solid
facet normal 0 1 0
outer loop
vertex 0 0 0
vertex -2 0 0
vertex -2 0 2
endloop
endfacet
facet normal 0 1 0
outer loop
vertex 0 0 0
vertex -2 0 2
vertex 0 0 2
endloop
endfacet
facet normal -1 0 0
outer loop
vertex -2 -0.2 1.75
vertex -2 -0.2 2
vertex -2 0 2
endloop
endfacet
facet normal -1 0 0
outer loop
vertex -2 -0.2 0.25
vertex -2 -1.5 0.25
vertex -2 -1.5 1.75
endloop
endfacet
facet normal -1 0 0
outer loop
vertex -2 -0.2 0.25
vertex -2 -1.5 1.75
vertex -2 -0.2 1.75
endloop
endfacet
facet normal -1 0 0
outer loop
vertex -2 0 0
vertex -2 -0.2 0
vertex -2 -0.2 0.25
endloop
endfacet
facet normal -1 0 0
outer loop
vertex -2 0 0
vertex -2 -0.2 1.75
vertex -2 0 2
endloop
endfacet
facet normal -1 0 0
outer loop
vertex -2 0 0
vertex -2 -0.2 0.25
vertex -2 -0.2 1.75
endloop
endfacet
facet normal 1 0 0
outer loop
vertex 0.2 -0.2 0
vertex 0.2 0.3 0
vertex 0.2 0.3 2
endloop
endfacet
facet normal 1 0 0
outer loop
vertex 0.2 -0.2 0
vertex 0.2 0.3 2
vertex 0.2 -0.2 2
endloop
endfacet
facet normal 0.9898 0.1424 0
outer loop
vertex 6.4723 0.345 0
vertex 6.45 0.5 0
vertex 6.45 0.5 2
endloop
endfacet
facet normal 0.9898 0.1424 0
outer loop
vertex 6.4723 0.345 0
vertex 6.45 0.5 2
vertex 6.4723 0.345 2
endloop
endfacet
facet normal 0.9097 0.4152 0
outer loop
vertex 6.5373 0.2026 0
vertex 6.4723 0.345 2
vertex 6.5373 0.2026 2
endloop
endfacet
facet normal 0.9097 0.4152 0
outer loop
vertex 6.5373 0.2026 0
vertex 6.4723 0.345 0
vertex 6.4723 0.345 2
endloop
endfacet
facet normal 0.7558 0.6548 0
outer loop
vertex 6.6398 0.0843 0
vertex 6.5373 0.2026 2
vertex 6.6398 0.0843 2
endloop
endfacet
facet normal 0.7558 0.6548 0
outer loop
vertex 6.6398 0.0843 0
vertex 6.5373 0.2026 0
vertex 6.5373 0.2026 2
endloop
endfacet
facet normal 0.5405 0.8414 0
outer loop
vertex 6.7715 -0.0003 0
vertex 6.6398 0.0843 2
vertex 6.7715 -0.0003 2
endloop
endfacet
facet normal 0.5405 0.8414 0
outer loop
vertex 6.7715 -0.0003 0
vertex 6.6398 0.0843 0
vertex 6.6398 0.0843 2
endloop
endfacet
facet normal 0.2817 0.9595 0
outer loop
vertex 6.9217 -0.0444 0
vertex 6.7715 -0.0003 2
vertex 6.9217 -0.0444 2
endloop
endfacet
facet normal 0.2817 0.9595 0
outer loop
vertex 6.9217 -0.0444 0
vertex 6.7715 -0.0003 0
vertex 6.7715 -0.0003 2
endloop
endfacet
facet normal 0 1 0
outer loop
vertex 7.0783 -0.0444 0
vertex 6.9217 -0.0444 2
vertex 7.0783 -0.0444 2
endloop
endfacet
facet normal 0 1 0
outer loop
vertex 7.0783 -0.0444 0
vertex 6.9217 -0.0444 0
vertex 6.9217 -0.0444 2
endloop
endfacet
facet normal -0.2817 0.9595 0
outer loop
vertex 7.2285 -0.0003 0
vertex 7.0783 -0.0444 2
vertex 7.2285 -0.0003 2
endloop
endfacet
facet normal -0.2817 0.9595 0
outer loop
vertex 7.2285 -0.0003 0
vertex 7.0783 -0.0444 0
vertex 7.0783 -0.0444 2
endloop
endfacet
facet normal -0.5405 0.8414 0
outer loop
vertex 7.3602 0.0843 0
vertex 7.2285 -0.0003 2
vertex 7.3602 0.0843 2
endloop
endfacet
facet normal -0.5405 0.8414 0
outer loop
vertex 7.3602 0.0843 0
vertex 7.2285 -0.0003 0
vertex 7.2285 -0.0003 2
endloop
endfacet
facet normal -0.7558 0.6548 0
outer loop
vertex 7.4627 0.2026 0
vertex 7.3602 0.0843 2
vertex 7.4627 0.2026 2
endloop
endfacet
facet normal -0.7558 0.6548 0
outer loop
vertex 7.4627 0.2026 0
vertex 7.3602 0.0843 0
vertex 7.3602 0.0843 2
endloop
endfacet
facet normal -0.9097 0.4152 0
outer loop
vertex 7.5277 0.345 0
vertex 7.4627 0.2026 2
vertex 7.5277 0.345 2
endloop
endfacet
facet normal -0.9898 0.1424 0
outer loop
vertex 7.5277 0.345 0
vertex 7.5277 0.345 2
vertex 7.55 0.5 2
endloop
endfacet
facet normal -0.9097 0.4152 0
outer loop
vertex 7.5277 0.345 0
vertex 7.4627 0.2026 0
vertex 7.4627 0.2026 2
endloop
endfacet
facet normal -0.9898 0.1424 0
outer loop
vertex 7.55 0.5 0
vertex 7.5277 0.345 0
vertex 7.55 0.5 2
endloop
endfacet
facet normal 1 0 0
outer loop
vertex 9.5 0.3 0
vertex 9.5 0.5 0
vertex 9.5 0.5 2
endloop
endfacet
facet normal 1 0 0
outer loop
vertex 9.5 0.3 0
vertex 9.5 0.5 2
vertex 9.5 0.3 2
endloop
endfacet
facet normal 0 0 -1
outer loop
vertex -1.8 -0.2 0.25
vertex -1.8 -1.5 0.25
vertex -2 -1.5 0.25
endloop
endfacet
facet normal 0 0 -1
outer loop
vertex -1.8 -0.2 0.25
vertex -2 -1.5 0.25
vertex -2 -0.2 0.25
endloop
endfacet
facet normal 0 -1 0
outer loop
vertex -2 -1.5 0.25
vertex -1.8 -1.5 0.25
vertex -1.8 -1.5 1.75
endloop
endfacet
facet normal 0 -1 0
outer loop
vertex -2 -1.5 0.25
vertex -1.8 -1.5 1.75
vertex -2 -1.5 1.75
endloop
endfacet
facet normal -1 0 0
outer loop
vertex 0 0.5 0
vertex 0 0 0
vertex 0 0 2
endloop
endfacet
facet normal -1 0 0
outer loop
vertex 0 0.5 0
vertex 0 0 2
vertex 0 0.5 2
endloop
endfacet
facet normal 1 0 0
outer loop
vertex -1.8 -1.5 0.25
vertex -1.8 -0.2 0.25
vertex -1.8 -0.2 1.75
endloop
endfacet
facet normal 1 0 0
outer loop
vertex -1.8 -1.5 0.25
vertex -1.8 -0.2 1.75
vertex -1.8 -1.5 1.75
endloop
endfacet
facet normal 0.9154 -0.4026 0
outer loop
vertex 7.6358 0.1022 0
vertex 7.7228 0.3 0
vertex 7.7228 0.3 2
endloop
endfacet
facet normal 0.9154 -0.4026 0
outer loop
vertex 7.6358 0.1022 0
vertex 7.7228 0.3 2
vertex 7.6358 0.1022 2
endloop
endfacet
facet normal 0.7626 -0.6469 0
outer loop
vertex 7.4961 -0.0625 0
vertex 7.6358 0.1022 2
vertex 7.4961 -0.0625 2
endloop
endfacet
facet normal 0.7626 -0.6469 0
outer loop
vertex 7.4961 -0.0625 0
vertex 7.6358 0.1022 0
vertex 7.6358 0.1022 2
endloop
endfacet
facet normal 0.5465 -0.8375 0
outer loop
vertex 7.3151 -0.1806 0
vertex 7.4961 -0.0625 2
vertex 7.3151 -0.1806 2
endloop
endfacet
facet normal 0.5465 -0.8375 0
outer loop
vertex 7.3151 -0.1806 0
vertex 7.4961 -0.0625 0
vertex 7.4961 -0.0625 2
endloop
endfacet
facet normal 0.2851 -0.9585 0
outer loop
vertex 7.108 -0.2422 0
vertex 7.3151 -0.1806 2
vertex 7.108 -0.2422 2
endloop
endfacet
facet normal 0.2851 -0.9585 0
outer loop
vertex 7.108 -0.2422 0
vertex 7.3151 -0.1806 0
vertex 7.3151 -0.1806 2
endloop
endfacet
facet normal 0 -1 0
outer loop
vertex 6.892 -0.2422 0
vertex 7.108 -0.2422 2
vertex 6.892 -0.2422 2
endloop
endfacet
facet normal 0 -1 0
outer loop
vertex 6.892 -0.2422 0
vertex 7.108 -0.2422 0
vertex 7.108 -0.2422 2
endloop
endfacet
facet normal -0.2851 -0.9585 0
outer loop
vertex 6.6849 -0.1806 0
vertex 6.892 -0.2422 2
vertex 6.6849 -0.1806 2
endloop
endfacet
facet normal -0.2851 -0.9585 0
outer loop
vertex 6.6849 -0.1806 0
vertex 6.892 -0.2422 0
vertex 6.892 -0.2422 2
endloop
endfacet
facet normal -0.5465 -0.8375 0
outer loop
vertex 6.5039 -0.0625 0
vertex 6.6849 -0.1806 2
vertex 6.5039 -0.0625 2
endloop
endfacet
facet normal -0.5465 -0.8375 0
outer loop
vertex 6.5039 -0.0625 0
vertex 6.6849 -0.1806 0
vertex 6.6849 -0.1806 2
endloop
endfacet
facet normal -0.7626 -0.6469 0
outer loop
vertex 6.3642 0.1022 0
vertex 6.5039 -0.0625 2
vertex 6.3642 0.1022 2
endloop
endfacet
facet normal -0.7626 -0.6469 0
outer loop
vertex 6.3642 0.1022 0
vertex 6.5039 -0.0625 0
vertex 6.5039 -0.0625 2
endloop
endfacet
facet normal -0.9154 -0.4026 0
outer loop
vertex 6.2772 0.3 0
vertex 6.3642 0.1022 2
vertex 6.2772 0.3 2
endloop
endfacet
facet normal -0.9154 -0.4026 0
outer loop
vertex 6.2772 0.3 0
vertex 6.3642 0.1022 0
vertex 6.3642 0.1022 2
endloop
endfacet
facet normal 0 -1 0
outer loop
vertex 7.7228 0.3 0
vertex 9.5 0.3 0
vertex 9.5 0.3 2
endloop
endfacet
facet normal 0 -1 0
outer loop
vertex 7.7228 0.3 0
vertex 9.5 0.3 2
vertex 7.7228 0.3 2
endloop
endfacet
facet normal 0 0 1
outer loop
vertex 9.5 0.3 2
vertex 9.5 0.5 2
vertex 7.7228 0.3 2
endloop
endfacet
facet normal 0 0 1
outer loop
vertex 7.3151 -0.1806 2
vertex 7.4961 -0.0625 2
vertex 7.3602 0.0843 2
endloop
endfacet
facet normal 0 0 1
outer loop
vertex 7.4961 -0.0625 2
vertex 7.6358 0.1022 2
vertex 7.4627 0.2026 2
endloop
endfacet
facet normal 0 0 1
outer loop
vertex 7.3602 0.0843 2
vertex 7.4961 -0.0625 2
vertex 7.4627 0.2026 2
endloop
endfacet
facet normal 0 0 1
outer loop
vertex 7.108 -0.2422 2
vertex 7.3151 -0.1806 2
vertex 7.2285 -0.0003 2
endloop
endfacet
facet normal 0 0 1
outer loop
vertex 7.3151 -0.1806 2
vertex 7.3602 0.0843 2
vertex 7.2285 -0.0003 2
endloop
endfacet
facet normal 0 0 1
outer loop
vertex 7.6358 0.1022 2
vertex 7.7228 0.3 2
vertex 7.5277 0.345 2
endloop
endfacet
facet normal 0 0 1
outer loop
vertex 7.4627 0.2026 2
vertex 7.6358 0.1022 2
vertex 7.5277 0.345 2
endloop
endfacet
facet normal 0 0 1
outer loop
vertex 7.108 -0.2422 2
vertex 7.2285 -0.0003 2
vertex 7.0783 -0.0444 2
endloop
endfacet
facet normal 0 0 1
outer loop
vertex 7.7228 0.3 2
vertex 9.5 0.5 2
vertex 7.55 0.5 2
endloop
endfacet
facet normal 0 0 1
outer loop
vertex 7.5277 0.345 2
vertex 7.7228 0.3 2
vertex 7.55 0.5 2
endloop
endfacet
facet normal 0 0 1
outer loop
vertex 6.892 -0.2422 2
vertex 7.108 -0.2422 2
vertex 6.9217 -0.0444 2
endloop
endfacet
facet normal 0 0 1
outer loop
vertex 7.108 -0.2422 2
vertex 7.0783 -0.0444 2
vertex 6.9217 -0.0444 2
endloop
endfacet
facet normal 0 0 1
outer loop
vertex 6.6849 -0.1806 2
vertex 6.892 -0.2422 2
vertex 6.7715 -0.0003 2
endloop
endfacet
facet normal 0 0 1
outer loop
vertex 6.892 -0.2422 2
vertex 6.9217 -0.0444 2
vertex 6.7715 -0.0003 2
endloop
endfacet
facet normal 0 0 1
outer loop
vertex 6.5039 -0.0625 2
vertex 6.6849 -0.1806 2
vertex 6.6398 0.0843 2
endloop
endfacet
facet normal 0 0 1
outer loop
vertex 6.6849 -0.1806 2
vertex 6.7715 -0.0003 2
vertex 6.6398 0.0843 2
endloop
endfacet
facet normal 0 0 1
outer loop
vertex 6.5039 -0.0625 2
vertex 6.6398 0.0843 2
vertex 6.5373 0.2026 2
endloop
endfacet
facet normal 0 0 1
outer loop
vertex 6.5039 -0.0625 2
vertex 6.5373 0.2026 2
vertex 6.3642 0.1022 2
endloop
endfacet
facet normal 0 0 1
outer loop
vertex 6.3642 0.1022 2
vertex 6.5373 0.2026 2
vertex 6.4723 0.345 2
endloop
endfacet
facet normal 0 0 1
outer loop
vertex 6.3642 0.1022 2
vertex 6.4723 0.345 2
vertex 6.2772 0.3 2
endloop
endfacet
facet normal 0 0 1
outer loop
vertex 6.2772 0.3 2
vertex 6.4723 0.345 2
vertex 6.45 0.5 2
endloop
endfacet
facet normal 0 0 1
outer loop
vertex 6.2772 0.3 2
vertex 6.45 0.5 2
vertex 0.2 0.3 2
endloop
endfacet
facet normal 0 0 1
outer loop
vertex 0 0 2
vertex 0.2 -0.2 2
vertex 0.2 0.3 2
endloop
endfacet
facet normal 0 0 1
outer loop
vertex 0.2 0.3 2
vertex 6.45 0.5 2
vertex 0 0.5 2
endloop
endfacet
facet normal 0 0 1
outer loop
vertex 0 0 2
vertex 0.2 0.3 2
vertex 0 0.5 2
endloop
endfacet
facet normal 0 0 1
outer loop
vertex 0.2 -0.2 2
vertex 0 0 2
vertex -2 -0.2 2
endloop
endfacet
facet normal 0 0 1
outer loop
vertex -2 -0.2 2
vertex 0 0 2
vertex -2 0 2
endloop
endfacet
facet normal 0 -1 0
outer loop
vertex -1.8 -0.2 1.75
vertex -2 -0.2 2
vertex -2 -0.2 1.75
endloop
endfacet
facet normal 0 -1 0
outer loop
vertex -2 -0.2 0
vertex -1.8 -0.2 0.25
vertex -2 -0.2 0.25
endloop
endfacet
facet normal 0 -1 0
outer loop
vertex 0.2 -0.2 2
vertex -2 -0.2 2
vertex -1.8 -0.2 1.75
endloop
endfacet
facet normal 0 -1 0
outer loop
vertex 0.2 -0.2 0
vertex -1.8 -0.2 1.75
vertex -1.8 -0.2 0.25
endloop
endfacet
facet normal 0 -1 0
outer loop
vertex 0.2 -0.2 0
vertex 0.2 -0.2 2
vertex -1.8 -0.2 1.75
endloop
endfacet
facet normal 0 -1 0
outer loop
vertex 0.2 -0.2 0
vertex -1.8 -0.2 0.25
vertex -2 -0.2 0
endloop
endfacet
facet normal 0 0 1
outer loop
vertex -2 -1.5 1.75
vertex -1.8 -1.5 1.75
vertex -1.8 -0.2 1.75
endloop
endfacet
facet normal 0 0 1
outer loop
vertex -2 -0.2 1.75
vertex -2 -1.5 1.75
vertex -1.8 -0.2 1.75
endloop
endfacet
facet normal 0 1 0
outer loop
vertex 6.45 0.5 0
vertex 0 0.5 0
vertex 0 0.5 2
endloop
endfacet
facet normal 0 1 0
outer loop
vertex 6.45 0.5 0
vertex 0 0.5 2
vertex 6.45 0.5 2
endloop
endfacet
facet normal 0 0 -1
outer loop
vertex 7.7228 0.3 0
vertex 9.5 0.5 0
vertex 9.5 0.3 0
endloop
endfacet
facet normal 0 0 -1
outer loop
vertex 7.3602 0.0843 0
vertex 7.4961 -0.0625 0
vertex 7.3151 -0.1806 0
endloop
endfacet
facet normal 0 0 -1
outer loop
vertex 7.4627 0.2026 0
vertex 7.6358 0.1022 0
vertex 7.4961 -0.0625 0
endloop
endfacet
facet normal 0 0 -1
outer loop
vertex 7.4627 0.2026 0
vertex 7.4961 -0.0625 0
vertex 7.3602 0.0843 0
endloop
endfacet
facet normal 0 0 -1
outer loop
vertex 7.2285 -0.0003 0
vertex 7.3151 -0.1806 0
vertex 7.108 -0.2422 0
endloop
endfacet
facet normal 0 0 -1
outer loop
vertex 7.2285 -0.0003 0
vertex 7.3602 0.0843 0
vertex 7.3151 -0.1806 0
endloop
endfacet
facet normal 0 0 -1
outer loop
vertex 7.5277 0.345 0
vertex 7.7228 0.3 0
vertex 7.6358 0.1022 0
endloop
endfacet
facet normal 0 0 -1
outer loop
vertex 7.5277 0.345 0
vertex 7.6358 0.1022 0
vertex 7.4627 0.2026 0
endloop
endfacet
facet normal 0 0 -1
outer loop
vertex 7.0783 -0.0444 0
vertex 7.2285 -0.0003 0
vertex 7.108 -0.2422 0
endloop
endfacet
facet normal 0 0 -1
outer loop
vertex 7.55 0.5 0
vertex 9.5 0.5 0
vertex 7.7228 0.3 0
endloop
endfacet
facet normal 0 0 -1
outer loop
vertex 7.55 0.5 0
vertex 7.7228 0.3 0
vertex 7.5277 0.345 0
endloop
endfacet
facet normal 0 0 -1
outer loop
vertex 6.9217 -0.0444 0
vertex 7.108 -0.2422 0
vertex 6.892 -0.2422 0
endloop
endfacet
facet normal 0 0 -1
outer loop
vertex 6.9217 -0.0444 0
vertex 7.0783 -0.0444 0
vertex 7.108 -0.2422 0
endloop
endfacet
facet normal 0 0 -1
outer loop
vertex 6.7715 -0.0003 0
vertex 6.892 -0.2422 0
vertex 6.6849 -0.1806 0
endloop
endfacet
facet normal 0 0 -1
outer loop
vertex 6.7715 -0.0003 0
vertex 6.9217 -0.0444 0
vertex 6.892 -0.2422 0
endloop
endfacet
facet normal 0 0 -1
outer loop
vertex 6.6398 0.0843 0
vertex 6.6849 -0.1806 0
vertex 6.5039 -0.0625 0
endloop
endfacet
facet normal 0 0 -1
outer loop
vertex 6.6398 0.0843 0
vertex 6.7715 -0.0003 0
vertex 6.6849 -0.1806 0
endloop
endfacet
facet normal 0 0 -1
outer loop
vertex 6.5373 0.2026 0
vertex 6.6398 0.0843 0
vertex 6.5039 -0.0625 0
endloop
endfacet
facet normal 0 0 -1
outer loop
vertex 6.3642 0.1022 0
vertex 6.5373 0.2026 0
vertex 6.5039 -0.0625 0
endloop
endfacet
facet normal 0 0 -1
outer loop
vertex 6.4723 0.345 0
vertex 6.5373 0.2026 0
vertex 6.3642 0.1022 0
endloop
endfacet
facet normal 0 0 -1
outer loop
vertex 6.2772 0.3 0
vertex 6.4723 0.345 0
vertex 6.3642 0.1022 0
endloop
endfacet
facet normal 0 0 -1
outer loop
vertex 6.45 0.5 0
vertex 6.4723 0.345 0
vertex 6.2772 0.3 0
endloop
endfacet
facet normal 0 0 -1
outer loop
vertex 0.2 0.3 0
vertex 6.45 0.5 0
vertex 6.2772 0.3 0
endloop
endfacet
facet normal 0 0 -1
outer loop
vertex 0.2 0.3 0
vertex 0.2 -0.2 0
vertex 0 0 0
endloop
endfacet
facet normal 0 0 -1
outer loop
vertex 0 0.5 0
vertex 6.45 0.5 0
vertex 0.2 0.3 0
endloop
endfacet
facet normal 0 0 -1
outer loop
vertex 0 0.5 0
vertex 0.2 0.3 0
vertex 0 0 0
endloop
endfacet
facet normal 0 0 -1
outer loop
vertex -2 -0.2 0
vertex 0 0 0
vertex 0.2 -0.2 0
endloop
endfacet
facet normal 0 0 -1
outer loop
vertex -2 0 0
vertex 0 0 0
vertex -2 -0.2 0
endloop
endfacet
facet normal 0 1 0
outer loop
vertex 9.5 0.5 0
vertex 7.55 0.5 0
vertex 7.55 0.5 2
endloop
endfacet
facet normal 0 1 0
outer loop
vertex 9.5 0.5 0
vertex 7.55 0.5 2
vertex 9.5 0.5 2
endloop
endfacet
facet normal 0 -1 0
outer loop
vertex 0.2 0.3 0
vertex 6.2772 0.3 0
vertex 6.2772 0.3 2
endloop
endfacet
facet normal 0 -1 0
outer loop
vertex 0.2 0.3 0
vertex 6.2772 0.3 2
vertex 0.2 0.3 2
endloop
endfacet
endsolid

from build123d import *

# Parameters (mm, degrees)
EXTRUDE_1_DEPTH     = 2
SKETCH_3_W          = 0.25
SKETCH_3_H          = 1.3
CUT_EXTRUDE_2_DEPTH = 1.2


with BuildPart() as part:
    # 草图1 → 凸台-拉伸1 (new body)
    with BuildSketch(Plane.XY):
        with BuildLine():
            Line((0, 0), (0, 0.5))
            Line((0, 0.5), (6.45, 0.5))
            ThreePointArc((6.45, 0.5), (7, -0.05), (7.55, 0.5))
            Line((7.55, 0.5), (9.5, 0.5))
            Line((9.5, 0.5), (9.5, 0.3))
            Line((9.5, 0.3), (7.722841615, 0.3))
            ThreePointArc((7.722841615, 0.3), (7, -0.25), (6.277158385, 0.3))
            Line((6.277158385, 0.3), (0.2, 0.3))
            Line((0.2, 0.3), (0.2, -0.2))
            Line((0.2, -0.2), (-1.8, -0.2))
            Line((-1.8, -0.2), (-1.8, -1.5))
            Line((-1.8, -1.5), (-2, -1.5))
            Line((-2, -1.5), (-2, 0))
            Line((-2, 0), (0, 0))
        make_face()
    extrude(amount=EXTRUDE_1_DEPTH)

    # 草图3 → 切除-拉伸2 (cut, through all)
    with BuildSketch(Plane(origin=(-1.8, 0, 0), x_dir=(0, 0, -1), z_dir=(1, 0, 0))):
        with Locations((-1.875, -0.85)):
            Rectangle(SKETCH_3_W, SKETCH_3_H)
        with Locations((-0.125, -0.85)):
            Rectangle(SKETCH_3_W, SKETCH_3_H)
    extrude(amount=-CUT_EXTRUDE_2_DEPTH, mode=Mode.SUBTRACT)


solid = part.part
